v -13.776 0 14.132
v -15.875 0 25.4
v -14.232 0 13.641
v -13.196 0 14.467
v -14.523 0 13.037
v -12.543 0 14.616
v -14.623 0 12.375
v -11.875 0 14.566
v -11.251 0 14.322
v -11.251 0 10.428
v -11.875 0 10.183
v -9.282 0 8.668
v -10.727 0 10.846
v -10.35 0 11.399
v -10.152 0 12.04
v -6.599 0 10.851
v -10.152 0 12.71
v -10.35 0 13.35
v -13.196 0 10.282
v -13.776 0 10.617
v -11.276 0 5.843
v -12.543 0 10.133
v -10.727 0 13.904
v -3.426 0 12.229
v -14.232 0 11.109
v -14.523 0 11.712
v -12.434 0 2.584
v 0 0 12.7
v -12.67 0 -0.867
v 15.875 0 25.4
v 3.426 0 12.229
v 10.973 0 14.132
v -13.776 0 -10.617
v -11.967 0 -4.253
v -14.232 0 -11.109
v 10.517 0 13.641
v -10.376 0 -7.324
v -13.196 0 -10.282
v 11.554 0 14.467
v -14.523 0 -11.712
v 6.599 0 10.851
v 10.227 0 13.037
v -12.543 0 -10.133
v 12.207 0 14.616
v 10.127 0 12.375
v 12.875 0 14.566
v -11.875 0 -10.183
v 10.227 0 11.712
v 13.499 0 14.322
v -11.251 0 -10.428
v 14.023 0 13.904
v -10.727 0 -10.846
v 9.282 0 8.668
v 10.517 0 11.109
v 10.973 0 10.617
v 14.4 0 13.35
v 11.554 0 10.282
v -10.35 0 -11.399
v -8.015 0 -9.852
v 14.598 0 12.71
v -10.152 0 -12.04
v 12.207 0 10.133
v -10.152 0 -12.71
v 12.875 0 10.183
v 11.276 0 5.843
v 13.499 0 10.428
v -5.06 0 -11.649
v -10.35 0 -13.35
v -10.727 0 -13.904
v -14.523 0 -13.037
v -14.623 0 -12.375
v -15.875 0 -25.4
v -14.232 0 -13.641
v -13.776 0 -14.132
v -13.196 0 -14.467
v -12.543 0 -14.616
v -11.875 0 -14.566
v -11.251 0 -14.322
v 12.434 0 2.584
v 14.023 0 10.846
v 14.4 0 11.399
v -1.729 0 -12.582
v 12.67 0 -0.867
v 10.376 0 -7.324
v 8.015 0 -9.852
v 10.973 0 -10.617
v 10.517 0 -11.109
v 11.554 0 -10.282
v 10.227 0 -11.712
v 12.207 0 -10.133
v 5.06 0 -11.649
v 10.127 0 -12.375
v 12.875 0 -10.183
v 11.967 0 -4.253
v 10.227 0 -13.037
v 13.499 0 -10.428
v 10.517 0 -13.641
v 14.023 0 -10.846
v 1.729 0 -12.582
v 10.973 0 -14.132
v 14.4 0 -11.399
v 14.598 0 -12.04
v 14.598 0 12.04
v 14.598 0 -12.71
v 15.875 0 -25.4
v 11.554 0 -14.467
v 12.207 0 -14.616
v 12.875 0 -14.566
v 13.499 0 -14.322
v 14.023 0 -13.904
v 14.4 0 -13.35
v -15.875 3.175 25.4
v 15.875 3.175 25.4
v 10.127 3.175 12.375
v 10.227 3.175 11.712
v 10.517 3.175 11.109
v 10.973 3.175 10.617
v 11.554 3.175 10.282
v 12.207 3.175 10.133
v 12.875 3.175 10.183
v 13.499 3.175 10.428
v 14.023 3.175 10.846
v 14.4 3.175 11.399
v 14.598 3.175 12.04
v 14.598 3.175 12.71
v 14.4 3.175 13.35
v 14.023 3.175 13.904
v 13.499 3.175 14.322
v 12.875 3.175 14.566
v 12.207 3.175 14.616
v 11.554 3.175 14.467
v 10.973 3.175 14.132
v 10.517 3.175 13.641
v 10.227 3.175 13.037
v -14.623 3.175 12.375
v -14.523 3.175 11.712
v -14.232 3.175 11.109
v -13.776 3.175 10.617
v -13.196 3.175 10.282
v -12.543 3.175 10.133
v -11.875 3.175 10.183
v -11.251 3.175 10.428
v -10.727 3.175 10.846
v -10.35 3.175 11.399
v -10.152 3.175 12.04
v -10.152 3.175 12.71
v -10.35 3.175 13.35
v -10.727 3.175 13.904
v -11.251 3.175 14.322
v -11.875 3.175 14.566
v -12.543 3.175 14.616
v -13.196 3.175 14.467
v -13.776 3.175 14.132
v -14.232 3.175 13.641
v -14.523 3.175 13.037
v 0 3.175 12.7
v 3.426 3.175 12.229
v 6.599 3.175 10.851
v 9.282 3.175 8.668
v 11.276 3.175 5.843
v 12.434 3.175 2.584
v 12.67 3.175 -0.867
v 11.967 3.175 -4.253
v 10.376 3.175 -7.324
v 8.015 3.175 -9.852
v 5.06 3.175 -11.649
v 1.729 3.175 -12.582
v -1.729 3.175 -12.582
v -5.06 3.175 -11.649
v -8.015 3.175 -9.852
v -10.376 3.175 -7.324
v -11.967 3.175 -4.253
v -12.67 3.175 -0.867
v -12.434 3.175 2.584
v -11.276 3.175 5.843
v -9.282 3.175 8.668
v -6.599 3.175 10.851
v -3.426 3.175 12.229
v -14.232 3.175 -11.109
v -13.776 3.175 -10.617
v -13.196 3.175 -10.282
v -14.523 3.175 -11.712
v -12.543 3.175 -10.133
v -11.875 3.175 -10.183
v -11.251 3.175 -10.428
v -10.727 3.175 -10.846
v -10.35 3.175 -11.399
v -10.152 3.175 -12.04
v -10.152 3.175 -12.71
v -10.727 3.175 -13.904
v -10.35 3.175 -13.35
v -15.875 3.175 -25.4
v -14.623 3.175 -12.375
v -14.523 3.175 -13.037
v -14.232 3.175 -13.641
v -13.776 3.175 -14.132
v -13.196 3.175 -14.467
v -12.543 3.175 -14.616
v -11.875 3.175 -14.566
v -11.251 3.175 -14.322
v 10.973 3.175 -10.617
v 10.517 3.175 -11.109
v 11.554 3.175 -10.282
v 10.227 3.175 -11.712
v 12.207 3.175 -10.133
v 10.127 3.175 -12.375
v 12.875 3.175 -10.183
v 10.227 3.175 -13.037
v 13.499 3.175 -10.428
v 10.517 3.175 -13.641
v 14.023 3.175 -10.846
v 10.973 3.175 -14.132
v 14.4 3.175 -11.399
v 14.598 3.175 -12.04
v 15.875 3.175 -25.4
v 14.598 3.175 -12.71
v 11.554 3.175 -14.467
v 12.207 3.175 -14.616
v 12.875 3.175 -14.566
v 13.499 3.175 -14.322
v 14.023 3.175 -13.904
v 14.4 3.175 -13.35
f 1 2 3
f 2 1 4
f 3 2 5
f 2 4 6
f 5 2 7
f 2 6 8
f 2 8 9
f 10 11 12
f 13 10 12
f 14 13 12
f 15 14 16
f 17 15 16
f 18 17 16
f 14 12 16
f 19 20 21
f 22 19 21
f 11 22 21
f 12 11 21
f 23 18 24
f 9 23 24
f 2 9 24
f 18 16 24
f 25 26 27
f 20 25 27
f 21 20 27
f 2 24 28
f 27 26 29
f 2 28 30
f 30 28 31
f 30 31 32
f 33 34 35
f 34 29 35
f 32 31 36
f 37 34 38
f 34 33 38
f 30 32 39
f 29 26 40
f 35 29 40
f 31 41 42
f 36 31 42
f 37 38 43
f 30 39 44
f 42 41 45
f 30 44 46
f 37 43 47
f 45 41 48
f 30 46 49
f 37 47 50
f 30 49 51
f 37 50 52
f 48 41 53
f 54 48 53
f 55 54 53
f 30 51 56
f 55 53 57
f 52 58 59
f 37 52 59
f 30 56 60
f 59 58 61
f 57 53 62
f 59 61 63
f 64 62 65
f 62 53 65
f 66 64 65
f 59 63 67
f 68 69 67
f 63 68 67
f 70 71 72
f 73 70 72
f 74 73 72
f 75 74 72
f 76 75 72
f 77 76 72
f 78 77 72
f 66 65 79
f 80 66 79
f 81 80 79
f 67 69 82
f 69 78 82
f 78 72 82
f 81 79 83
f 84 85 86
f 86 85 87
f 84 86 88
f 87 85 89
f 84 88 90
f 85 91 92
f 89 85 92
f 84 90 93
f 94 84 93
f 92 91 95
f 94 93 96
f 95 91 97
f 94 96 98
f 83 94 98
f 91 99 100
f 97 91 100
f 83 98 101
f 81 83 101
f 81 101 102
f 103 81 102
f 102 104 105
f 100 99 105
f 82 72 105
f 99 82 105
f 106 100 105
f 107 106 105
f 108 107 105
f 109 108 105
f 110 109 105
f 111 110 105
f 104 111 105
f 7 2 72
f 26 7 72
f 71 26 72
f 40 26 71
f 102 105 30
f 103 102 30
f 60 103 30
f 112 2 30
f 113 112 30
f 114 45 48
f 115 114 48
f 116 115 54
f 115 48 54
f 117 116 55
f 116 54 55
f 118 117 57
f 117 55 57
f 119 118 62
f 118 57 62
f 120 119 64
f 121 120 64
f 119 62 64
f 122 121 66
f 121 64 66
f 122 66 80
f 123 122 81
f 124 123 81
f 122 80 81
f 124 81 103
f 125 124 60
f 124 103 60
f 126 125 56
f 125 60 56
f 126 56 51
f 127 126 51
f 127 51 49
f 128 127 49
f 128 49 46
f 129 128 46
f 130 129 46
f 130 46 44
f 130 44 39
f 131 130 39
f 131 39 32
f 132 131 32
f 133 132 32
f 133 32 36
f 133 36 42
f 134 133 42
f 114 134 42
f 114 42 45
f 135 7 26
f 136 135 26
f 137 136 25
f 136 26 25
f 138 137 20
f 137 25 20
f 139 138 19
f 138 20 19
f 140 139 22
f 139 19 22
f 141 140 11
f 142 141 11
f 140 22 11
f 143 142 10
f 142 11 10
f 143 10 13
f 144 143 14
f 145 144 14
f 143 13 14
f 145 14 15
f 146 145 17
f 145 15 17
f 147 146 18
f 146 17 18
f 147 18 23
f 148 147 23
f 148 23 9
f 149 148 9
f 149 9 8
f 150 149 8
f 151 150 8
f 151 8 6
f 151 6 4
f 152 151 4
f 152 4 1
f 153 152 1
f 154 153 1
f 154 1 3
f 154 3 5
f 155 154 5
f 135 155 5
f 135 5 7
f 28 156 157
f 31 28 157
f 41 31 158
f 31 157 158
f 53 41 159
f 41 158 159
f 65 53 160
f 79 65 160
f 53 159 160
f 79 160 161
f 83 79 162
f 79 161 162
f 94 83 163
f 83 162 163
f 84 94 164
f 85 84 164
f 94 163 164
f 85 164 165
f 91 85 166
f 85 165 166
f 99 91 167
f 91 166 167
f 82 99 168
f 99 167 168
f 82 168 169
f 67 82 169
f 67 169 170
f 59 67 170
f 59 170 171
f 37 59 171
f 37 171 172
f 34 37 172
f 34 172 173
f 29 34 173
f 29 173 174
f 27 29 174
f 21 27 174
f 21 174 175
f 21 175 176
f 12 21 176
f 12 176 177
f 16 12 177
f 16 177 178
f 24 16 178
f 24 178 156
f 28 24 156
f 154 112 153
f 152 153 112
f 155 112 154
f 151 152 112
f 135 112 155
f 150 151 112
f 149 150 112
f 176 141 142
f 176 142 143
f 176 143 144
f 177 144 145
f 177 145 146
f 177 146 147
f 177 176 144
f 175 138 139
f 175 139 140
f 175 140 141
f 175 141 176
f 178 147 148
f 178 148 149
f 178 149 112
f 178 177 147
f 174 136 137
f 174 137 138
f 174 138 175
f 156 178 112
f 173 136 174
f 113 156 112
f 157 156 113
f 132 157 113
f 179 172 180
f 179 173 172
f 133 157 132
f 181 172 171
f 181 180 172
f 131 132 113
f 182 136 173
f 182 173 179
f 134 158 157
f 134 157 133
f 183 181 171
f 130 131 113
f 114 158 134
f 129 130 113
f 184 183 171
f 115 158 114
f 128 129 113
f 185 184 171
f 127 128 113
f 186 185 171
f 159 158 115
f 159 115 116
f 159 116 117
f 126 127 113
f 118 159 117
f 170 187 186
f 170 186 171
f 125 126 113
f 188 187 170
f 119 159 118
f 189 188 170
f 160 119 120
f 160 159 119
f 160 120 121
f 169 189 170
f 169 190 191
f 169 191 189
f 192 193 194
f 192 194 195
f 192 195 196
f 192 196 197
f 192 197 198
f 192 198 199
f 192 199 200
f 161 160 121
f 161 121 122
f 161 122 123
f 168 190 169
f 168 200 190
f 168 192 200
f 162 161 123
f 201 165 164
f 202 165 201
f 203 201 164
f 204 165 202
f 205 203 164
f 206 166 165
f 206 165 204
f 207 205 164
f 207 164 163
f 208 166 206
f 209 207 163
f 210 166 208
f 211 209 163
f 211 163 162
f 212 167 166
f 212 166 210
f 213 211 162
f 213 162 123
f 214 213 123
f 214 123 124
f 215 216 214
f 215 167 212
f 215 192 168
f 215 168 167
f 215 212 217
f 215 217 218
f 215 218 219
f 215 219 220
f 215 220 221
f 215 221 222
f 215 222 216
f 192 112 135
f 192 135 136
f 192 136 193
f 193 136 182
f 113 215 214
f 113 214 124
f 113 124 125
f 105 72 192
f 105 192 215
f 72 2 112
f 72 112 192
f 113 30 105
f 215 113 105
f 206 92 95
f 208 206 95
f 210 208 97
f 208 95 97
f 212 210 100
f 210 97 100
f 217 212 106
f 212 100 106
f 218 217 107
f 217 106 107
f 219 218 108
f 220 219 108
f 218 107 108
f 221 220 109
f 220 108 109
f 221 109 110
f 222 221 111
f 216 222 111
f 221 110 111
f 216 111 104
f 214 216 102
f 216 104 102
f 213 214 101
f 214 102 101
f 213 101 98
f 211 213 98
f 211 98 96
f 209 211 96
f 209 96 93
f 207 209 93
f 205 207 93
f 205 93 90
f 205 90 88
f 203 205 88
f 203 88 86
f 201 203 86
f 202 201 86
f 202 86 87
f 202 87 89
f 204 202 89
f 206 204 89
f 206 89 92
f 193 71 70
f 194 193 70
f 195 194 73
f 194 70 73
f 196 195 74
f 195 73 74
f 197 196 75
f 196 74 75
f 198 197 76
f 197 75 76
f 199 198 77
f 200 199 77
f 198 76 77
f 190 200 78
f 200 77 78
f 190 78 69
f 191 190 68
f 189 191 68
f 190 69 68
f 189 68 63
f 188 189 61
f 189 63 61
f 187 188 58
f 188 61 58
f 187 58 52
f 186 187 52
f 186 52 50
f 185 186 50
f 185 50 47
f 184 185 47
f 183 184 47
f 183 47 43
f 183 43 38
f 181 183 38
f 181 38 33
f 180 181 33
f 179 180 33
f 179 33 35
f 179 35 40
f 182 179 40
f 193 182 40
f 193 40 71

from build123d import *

# Parameters (mm, degrees)
SKETCH1_W            = 31.75
SKETCH1_H            = 50.8
BOSS_EXTRUDE1_DEPTH  = 3.175
CUT_EXTRUDE1_REACH   = 32.121
SKETCH2_R            = 12.7
M4_CLEARANCE_HOLE1_D = 4.4958


with BuildPart() as part:
    # Sketch1 → Boss-Extrude1 (new body)
    with BuildSketch(Plane(origin=(0, 0, 0), x_dir=(1, 0, 0), z_dir=(0, 1, 0))):
        Rectangle(SKETCH1_W, SKETCH1_H)
    extrude(amount=BOSS_EXTRUDE1_DEPTH)

    # Sketch2 → Cut-Extrude1 (cut, up to next)
    with BuildSketch(Plane(origin=(0, 3.175, 0), x_dir=(1, 0, 0), z_dir=(0, 1, 0)), mode=Mode.PRIVATE) as cut_extrude1_sk1:
        with Locations(Location((0, 0, 0), (0, 0, 270))):
            Circle(SKETCH2_R)
    cut_extrude1_tool1 = extrude(cut_extrude1_sk1.sketch, amount=-CUT_EXTRUDE1_REACH, mode=Mode.PRIVATE) & part.part
    add(cut_extrude1_tool1.solids().sort_by_distance((0, 3.175, 0))[0], mode=Mode.SUBTRACT)

    # M4 Clearance Hole1 (through all)
    with Locations(Plane(origin=(0, 3.175, 0), x_dir=(1, 0, 0), z_dir=(0, 1, 0))):
        with Locations((12.374792935, -12.374792935), (-12.374792935, -12.374792935), (-12.374792935, 12.374792935), (12.374792935, 12.374792935)):
            Hole(M4_CLEARANCE_HOLE1_D / 2)


solid = part.part
